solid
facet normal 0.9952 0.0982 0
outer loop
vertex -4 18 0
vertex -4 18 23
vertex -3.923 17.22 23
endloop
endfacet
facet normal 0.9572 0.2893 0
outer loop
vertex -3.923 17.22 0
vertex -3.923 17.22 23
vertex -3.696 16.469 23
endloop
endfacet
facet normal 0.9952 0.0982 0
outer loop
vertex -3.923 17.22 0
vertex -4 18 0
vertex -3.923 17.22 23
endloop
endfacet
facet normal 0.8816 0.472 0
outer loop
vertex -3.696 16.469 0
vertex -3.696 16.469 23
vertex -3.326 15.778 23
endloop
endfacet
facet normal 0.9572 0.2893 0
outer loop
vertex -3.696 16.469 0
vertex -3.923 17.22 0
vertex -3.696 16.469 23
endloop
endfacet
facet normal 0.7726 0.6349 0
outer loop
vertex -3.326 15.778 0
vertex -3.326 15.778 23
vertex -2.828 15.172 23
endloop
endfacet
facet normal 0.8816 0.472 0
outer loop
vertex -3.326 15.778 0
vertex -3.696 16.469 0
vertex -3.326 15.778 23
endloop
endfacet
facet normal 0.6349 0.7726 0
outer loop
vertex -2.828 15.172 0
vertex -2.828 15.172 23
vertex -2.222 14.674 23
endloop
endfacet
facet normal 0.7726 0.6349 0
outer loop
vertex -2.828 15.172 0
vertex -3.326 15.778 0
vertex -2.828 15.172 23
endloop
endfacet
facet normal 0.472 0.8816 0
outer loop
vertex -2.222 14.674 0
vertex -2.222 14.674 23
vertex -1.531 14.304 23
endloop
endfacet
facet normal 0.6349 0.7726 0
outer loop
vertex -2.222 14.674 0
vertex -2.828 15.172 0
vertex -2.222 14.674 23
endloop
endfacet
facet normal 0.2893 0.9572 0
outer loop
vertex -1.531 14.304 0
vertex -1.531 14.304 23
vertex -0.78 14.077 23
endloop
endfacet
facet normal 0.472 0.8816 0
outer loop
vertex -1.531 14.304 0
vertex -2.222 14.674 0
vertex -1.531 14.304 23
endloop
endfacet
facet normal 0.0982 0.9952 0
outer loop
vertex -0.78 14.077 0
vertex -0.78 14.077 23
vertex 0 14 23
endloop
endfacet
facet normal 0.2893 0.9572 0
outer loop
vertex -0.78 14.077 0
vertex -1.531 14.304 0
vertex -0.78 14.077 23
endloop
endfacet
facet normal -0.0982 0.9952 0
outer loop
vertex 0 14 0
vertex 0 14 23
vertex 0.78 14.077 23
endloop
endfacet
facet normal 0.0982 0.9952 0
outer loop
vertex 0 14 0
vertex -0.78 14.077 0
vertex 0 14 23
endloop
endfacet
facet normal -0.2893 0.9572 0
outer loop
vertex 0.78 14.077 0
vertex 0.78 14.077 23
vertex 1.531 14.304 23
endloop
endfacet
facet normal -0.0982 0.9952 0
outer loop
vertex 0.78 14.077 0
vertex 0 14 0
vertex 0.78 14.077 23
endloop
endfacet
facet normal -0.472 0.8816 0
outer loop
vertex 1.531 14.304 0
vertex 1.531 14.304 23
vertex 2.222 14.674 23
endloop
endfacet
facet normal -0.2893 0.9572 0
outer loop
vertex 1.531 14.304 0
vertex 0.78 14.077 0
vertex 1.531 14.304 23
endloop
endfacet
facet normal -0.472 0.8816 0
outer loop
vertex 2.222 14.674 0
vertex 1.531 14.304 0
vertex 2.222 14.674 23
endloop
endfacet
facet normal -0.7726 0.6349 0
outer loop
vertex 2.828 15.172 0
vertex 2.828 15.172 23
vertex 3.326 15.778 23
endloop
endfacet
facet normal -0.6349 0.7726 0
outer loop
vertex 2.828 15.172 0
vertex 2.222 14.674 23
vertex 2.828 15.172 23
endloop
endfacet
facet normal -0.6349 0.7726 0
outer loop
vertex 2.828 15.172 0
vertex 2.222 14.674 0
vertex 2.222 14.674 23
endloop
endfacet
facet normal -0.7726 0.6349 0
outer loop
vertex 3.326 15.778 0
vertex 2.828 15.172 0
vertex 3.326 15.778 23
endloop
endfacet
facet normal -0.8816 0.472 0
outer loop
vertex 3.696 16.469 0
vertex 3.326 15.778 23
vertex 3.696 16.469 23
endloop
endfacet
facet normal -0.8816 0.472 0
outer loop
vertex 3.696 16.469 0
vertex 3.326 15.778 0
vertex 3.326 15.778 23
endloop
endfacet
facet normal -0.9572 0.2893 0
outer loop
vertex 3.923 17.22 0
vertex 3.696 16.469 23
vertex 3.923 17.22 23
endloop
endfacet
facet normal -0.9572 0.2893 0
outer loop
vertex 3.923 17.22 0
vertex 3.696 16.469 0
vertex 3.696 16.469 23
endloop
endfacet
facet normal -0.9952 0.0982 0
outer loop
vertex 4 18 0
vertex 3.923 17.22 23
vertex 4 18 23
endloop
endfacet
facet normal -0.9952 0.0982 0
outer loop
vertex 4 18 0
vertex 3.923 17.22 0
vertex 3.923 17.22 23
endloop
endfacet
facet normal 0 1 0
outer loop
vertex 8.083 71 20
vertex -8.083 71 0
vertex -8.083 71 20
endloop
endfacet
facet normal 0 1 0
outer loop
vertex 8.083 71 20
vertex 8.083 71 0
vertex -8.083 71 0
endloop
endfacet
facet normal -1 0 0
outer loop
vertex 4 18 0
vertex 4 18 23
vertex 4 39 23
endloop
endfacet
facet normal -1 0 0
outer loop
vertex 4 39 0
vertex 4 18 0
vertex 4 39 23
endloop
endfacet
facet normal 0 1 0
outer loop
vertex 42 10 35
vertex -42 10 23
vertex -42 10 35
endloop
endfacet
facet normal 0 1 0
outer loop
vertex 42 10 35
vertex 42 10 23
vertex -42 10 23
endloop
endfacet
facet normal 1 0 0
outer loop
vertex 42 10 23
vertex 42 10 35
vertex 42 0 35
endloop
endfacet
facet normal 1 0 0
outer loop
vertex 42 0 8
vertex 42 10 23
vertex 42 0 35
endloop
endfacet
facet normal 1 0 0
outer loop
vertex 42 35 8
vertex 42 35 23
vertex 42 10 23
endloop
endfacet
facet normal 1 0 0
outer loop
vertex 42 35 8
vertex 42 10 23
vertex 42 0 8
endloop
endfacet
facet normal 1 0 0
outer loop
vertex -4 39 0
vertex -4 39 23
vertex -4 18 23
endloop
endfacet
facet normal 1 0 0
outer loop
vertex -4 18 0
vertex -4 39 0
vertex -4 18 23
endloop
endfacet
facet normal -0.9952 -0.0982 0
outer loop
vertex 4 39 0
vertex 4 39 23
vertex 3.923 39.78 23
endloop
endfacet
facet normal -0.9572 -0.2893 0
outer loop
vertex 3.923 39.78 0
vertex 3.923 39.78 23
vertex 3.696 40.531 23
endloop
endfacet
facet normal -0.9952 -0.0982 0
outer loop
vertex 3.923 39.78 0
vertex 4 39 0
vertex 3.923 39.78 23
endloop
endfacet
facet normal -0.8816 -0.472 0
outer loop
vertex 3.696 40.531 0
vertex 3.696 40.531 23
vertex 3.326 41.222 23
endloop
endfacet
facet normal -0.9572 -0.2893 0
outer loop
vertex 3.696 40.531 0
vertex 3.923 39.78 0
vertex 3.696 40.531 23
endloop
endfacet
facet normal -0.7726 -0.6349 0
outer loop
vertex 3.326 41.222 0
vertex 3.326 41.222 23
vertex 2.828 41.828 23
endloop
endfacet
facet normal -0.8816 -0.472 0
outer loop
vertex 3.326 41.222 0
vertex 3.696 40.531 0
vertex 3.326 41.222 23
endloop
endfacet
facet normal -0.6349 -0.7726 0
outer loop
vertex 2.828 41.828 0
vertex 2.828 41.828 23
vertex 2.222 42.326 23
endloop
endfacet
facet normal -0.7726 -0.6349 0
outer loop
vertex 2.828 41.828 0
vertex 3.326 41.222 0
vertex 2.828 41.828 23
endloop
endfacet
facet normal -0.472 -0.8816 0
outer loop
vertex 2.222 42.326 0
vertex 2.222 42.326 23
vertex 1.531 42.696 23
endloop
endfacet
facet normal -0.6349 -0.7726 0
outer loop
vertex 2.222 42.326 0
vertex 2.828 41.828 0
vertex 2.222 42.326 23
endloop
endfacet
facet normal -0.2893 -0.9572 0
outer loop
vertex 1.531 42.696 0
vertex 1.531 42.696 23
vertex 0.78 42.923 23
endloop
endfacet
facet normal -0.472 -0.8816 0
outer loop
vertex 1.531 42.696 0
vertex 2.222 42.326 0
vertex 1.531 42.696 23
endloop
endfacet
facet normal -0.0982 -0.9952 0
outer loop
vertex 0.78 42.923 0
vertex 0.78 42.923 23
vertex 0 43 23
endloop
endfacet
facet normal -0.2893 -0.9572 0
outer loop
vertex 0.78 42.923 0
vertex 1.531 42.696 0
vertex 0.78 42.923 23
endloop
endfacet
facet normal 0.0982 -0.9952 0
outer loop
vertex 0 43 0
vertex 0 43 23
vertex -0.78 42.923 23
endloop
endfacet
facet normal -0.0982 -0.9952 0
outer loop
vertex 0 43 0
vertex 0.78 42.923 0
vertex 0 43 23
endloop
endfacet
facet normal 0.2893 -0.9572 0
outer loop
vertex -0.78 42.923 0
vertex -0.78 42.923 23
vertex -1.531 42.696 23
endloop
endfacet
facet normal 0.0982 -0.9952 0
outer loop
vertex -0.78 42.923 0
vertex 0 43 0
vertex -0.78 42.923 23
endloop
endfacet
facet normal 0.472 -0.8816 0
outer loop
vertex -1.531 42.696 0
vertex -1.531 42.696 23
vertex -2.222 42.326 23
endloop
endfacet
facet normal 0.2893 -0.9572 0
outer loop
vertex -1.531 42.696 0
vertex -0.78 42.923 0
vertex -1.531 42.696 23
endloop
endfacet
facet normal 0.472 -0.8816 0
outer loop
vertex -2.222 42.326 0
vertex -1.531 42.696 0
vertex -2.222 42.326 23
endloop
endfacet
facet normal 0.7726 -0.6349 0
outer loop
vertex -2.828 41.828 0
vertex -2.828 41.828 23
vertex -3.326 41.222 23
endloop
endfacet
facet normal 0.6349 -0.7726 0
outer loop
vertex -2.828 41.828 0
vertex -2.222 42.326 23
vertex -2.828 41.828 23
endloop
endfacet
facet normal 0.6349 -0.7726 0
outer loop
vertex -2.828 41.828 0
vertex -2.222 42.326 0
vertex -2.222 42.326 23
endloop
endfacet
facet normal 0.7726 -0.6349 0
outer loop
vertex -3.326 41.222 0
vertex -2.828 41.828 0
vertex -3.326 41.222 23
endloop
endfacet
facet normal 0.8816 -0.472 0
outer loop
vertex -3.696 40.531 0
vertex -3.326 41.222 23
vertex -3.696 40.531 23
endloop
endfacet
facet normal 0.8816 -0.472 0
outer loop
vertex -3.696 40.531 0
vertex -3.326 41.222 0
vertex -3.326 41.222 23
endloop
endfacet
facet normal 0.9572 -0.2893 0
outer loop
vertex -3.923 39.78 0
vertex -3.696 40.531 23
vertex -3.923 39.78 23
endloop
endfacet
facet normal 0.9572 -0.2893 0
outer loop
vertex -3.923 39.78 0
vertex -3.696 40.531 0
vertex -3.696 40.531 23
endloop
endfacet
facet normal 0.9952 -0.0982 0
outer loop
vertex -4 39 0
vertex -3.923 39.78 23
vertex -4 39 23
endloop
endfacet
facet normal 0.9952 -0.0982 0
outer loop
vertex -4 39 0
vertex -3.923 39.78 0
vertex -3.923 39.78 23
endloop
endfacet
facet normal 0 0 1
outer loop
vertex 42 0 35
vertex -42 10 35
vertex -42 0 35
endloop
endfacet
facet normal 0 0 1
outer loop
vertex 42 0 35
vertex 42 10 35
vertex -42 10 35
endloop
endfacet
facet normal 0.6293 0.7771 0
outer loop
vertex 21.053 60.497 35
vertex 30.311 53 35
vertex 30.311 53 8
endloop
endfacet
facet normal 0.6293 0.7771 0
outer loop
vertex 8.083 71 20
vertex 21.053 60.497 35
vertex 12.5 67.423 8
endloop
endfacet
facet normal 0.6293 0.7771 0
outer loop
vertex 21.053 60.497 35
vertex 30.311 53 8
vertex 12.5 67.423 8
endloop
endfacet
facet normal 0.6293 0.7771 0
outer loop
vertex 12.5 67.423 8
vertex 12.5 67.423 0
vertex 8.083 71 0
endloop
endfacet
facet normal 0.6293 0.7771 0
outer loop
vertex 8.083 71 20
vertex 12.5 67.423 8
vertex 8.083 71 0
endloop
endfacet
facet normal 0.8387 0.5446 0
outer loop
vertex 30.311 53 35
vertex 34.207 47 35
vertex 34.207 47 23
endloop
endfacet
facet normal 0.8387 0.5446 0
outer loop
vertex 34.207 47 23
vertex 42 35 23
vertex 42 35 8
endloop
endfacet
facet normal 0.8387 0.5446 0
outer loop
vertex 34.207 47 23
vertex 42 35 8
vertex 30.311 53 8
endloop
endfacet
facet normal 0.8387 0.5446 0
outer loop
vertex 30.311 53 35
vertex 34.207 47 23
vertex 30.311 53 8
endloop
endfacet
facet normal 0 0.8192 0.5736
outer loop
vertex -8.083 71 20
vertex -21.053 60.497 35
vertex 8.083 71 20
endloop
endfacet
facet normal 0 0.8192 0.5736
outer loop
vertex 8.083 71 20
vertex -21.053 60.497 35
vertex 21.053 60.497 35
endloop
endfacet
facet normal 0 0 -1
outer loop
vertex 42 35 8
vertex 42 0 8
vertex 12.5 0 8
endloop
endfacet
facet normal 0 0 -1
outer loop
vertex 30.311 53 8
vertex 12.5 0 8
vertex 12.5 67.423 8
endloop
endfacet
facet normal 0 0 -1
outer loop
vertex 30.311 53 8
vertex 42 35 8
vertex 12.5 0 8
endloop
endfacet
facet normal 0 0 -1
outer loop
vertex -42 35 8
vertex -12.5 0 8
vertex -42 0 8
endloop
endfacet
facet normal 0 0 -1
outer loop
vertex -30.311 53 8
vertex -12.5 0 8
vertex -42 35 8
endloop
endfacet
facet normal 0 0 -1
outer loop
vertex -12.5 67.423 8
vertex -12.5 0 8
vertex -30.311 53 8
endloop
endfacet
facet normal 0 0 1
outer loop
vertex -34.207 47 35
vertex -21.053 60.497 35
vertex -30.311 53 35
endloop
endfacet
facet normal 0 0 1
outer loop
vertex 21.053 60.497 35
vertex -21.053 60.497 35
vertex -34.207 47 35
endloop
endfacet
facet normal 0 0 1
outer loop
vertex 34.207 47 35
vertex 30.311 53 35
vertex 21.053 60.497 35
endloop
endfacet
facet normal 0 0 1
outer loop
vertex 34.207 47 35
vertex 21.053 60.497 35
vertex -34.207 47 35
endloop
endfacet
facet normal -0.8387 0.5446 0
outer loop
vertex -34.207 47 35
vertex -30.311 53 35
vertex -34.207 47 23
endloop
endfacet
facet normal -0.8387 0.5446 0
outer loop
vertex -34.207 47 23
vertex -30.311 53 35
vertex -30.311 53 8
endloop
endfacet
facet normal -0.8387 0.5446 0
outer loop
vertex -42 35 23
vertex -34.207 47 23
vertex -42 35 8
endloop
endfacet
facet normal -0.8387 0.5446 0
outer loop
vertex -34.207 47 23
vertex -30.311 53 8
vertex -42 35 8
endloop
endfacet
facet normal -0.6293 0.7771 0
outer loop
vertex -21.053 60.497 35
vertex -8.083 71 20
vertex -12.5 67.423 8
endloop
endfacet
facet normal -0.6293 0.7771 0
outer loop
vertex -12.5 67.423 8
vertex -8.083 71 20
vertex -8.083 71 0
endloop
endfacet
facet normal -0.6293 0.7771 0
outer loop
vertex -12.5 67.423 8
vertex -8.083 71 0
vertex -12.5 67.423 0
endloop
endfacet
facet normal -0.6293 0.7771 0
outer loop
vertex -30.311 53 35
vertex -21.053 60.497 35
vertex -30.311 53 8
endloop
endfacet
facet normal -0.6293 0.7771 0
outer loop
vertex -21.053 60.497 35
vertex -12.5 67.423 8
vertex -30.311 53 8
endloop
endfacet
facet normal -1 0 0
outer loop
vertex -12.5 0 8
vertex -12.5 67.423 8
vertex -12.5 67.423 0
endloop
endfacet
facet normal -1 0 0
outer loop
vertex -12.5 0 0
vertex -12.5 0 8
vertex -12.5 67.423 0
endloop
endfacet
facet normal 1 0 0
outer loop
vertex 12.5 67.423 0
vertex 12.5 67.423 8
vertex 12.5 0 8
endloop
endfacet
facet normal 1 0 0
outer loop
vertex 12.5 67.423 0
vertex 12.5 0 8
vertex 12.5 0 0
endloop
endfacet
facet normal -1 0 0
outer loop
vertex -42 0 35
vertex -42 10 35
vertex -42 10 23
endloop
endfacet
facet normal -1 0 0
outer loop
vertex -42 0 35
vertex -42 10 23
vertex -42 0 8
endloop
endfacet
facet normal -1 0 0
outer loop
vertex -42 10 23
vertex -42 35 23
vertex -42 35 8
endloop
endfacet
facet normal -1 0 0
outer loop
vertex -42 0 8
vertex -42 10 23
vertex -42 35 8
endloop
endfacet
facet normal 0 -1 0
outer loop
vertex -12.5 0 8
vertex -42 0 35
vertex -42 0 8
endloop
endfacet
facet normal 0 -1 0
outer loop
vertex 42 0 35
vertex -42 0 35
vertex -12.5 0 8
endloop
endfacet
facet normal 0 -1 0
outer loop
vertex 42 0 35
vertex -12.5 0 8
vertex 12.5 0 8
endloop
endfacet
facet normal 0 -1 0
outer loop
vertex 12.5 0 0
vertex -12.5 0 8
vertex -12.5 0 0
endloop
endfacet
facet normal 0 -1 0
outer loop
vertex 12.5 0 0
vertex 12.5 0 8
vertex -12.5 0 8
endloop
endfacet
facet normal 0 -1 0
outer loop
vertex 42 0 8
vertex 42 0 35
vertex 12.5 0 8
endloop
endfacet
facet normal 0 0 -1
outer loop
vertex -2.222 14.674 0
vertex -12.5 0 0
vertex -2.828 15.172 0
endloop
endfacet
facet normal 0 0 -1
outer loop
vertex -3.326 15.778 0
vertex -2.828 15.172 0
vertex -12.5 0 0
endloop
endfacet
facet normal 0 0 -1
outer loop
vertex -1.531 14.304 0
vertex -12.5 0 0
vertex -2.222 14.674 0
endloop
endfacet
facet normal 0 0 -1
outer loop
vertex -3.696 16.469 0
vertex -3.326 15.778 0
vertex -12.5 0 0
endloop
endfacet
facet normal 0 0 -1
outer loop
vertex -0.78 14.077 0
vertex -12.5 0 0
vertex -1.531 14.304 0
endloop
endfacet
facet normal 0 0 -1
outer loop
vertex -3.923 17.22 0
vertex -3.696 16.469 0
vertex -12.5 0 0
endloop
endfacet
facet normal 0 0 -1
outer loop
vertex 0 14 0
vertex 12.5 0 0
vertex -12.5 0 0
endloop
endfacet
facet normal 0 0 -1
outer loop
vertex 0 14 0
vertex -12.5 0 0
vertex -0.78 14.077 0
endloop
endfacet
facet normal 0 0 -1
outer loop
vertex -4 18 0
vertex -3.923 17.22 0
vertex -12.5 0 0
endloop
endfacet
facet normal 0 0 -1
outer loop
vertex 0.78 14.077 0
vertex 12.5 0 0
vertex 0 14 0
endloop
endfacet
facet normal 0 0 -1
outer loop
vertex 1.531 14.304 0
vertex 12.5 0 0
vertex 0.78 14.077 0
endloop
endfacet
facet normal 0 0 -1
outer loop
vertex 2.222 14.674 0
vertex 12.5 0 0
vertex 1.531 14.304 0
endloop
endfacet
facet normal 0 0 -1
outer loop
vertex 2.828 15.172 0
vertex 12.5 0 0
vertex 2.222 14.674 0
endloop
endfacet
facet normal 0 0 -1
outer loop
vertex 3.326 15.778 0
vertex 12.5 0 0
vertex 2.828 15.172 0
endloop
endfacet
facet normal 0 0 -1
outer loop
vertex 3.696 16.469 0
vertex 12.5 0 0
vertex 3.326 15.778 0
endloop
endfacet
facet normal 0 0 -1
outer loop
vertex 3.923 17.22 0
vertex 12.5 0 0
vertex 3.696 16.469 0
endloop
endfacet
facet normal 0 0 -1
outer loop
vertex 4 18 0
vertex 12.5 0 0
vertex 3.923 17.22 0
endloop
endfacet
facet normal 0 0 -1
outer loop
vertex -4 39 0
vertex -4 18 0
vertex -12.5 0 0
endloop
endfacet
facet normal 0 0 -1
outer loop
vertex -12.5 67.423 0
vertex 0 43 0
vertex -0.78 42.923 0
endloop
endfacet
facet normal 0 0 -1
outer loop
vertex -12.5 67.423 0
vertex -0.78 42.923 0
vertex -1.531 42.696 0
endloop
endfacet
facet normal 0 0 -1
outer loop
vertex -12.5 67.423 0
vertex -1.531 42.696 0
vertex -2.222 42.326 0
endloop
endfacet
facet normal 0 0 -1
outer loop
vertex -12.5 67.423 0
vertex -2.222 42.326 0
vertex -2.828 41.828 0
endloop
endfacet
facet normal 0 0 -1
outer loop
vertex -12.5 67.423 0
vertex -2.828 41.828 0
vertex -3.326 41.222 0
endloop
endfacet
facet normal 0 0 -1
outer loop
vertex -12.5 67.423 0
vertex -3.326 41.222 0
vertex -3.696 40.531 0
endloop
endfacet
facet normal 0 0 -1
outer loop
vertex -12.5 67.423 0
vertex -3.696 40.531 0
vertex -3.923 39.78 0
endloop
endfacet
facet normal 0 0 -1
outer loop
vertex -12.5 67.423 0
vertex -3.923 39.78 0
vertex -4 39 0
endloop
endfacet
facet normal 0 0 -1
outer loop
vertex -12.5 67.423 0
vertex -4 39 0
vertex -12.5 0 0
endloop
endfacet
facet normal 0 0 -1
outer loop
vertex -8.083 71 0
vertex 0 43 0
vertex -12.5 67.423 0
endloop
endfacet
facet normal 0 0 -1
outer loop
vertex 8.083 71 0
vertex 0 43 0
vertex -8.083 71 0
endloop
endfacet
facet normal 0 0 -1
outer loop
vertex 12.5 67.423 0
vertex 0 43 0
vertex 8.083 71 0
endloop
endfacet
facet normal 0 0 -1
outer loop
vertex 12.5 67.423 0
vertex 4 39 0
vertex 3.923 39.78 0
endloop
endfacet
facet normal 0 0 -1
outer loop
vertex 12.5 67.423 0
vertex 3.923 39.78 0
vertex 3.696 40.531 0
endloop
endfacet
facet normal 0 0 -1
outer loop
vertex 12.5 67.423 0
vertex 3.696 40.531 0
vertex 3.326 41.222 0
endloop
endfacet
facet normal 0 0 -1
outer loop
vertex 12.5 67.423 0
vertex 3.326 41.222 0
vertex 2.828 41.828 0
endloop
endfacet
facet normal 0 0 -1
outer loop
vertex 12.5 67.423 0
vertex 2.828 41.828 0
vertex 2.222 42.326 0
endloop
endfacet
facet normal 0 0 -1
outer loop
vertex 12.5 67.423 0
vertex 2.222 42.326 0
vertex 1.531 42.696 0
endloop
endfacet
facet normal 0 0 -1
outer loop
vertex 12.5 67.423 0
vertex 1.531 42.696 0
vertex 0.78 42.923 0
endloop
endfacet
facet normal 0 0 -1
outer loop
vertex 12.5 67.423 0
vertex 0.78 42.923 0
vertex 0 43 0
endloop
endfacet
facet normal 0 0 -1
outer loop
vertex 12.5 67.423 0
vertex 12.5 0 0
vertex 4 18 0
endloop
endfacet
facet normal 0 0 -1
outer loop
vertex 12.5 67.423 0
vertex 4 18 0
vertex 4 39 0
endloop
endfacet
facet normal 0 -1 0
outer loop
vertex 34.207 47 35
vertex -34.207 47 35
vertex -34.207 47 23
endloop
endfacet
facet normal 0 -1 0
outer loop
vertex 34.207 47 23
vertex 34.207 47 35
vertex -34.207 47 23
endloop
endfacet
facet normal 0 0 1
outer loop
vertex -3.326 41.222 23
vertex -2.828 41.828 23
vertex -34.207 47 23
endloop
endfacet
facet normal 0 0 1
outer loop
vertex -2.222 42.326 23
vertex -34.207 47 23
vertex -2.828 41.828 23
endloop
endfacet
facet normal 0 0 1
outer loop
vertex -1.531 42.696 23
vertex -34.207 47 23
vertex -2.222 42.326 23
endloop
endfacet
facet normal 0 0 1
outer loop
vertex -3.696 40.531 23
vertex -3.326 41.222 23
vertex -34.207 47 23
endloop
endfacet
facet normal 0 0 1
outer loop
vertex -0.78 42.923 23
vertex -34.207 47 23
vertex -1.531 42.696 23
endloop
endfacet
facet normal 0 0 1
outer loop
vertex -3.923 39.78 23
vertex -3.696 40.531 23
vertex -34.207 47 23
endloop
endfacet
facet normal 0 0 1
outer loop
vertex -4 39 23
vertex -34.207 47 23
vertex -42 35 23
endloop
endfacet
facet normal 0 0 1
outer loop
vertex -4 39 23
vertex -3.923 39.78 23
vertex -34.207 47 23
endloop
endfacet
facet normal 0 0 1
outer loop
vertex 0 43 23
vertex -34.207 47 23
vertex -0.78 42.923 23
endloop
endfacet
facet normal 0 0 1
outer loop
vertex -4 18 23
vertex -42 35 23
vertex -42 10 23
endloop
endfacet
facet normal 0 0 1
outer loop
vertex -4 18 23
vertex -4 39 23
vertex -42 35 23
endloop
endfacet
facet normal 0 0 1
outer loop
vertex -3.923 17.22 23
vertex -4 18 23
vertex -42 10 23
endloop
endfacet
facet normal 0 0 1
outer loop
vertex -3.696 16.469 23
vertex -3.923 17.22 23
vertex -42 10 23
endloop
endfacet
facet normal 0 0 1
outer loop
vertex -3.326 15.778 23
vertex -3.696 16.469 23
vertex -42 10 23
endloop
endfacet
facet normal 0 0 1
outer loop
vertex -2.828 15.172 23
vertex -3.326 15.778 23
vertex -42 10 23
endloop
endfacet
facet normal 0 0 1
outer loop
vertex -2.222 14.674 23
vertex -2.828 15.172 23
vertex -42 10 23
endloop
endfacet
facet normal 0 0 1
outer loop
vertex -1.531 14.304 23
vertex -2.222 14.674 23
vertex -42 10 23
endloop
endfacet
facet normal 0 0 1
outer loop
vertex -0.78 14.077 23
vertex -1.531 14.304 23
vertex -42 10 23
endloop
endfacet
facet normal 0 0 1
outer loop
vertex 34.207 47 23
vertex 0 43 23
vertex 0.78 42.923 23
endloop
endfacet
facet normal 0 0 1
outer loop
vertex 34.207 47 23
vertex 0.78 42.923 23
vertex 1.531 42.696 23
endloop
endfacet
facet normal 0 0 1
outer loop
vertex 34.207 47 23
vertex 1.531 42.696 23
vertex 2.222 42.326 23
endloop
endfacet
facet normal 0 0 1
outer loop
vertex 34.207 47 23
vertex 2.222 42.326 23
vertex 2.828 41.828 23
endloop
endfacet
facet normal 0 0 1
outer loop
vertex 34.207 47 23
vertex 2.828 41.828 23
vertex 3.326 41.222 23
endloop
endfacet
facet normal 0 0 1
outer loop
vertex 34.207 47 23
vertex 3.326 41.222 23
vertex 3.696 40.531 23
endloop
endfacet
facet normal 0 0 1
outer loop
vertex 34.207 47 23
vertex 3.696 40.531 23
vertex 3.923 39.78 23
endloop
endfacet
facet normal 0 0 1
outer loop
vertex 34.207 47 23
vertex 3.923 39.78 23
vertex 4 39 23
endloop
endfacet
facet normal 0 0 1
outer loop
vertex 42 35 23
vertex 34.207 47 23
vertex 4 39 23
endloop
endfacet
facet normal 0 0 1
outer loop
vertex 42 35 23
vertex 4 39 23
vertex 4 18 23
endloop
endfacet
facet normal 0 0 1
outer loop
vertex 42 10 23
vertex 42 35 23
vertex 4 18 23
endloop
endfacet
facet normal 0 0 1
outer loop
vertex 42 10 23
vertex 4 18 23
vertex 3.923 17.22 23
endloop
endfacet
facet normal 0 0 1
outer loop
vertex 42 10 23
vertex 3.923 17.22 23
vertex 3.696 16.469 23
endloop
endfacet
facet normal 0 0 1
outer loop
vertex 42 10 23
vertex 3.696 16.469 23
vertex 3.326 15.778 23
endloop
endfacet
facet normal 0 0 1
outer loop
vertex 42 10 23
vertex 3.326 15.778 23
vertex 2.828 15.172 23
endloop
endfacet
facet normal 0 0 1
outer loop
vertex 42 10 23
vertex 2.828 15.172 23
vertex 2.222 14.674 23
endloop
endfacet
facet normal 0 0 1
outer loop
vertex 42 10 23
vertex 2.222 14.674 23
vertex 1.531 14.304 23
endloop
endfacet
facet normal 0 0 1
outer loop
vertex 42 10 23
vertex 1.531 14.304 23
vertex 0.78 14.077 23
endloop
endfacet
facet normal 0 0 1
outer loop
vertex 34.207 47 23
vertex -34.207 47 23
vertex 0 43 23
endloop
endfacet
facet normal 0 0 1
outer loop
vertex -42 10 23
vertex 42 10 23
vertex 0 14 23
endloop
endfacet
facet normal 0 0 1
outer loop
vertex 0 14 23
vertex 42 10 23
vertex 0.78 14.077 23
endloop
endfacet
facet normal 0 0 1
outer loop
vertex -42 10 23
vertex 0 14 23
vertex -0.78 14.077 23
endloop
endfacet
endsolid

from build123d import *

# Parameters (mm, degrees)
SKETCH1_W           = 8
SKETCH1_H           = 71
BOSS_EXTRUDE1_DEPTH = 12.5
BOSS_EXTRUDE2_DEPTH = 42
CUT_EXTRUDE1_REACH  = 91.61
CHAMFER1_SIZE       = 15
CHAMFER1_SIZE2      = 10.503113073


with BuildPart() as part:
    # Sketch1 → Boss-Extrude1 (new, symmetric)
    with BuildSketch(Plane(origin=(0, 0, 0), x_dir=(0, 0, -1), z_dir=(1, 0, 0))):
        with Locations((-4, 35.5)):
            Rectangle(SKETCH1_W, SKETCH1_H)
    extrude(amount=BOSS_EXTRUDE1_DEPTH, both=True)

    # Sketch1<3> → Boss-Extrude2 (add, symmetric)
    with BuildSketch(Plane(origin=(0, 0, 0), x_dir=(0, 0, -1), z_dir=(1, 0, 0))):
        Polygon((-35, 0), (-8, 0), (-8, 71), (-35, 71), (-35, 47), (-23, 47), (-23, 10), (-35, 10), align=None)
    extrude(amount=BOSS_EXTRUDE2_DEPTH, both=True)

    # Sketch2 → Cut-Extrude1 (cut, up to next)
    with BuildSketch(Plane.XY, mode=Mode.PRIVATE) as cut_extrude1_sk1:
        Polygon((42, 71), (8.082514505, 71), (30.310663322, 53), (42, 35), align=None)
    cut_extrude1_tool1 = extrude(cut_extrude1_sk1.sketch, amount=CUT_EXTRUDE1_REACH, mode=Mode.PRIVATE) & part.part
    # Sketch2 → Cut-Extrude1 (cut, up to next)
    with BuildSketch(Plane.XY, mode=Mode.PRIVATE) as cut_extrude1_sk2:
        with BuildLine():
            Line((4, 18), (4, 39))
            ThreePointArc((4, 39), (0, 43), (-4, 39))
            Line((-4, 39), (-4, 18))
            ThreePointArc((-4, 18), (0, 14), (4, 18))
        make_face()
    cut_extrude1_tool2 = extrude(cut_extrude1_sk2.sketch, amount=CUT_EXTRUDE1_REACH, mode=Mode.PRIVATE) & part.part
    # Sketch2 → Cut-Extrude1 (cut, up to next)
    with BuildSketch(Plane.XY, mode=Mode.PRIVATE) as cut_extrude1_sk3:
        Polygon((-8.082514505, 71), (-42, 71), (-42, 35), (-30.310663322, 53), align=None)
    cut_extrude1_tool3 = extrude(cut_extrude1_sk3.sketch, amount=CUT_EXTRUDE1_REACH, mode=Mode.PRIVATE) & part.part
    add(cut_extrude1_tool1.solids().sort_by_distance((31.410867, 60.103615, 0))[0], mode=Mode.SUBTRACT)
    add(cut_extrude1_tool2.solids().sort_by_distance((0, 28.5, 0))[0], mode=Mode.SUBTRACT)
    add(cut_extrude1_tool3.solids().sort_by_distance((-31.410867, 60.103615, 0))[0], mode=Mode.SUBTRACT)

    # Chamfer1
    chamfer1_edges = [part.edges().sort_by_distance(p)[0] for p in [
        (0, 71, 35),
    ]]
    chamfer1_side = [part.faces().sort_by_distance(p)[0] for p in [
        (0, 71, 17.5),
    ]]
    chamfer(chamfer1_edges, length=CHAMFER1_SIZE, length2=CHAMFER1_SIZE2, reference=chamfer1_side[0])


solid = part.part
